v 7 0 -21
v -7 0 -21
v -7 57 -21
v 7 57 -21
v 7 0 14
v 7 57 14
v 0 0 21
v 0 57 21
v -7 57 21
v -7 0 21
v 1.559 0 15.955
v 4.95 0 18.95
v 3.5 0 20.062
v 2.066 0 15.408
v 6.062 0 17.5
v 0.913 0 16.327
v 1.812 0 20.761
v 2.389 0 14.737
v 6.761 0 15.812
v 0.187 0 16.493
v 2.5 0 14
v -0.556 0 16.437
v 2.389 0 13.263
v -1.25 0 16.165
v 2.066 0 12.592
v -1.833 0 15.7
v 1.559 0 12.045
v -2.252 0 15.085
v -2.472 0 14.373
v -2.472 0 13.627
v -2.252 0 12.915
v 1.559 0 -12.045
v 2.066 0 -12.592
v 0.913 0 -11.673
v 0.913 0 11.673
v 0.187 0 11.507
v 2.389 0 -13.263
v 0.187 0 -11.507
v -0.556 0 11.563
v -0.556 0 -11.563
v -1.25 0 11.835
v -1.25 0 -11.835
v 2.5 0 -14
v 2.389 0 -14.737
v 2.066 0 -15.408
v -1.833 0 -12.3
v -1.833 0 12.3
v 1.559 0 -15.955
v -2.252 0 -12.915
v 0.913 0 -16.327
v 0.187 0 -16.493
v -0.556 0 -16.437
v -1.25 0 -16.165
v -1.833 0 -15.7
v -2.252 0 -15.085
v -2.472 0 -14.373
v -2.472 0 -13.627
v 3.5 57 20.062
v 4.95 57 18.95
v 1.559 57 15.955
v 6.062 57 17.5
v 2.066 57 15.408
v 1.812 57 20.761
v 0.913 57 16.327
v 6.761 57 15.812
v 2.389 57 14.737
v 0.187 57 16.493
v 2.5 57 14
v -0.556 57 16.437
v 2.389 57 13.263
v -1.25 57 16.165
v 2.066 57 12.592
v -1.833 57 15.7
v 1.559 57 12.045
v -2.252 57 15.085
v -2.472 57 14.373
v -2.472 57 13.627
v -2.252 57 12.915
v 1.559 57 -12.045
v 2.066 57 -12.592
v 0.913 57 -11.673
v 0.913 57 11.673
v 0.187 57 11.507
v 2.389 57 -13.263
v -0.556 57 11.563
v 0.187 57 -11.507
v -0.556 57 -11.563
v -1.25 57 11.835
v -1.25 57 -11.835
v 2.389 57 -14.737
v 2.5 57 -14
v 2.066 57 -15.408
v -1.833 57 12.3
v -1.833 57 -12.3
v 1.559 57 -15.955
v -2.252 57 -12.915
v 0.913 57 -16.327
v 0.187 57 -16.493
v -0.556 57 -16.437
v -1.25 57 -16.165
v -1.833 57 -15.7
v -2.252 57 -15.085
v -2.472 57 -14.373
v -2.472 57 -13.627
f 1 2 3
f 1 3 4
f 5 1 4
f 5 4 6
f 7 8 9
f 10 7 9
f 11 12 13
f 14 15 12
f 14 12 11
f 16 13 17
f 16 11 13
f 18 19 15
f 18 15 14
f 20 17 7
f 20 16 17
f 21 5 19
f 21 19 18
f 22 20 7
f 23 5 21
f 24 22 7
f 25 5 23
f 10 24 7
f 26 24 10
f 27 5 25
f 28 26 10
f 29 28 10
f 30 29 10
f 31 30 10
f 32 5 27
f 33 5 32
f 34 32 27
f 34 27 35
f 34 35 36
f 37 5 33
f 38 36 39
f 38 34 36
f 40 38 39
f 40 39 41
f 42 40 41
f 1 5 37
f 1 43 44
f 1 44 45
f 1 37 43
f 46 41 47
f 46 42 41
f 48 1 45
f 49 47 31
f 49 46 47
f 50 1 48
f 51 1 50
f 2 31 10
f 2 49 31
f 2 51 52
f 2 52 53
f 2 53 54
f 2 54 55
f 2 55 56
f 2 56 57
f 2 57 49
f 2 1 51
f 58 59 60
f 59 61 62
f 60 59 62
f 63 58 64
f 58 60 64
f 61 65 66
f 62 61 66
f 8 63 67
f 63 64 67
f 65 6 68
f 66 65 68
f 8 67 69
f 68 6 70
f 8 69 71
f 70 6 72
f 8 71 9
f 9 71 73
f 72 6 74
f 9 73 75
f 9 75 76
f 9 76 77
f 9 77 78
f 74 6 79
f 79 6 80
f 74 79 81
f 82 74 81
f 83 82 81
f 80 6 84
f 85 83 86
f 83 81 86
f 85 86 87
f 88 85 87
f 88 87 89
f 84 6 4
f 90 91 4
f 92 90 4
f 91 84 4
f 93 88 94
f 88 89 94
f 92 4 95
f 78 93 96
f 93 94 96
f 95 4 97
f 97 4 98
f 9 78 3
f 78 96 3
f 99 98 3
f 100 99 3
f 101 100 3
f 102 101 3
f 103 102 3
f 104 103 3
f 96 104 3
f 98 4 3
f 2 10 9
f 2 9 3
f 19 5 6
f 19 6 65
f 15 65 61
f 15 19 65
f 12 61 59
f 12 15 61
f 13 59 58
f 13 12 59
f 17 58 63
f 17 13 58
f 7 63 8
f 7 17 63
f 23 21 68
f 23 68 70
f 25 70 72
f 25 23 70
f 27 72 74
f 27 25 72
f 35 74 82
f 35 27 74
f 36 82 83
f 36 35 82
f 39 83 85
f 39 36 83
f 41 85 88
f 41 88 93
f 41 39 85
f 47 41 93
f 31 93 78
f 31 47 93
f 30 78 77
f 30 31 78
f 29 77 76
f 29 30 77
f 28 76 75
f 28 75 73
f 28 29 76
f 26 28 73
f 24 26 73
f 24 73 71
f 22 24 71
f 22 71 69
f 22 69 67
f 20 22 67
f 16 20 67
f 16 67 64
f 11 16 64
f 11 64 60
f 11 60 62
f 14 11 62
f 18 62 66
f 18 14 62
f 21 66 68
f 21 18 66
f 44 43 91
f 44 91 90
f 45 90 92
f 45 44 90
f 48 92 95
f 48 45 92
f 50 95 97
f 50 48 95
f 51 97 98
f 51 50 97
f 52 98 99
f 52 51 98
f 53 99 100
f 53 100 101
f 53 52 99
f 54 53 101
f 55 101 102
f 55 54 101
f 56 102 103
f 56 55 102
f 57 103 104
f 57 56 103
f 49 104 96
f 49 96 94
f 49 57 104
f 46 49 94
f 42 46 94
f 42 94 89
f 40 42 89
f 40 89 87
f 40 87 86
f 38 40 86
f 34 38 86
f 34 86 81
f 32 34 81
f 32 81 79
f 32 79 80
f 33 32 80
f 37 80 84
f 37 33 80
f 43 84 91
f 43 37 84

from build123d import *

# Parameters (mm, degrees)
SKETCH_1_R      = 2.5
EXTRUDE_1_DEPTH = 57


with BuildPart() as part:
    # 草图1 → 凸台-拉伸1 (new body)
    with BuildSketch(Plane(origin=(0, 0, 0), x_dir=(1, 0, 0), z_dir=(0, 1, 0))):
        with BuildLine():
            Line((-7, 21), (7, 21))
            Line((7, 21), (7, -14))
            ThreePointArc((7, -14), (4.949747468, -18.949747468), (0, -21))
            Line((0, -21), (-7, -21))
            Line((-7, -21), (-7, 21))
        make_face()
        with Locations((0, 14)):
            Circle(SKETCH_1_R, mode=Mode.SUBTRACT)
        with Locations((0, -14)):
            Circle(SKETCH_1_R, mode=Mode.SUBTRACT)
    extrude(amount=EXTRUDE_1_DEPTH)


solid = part.part
